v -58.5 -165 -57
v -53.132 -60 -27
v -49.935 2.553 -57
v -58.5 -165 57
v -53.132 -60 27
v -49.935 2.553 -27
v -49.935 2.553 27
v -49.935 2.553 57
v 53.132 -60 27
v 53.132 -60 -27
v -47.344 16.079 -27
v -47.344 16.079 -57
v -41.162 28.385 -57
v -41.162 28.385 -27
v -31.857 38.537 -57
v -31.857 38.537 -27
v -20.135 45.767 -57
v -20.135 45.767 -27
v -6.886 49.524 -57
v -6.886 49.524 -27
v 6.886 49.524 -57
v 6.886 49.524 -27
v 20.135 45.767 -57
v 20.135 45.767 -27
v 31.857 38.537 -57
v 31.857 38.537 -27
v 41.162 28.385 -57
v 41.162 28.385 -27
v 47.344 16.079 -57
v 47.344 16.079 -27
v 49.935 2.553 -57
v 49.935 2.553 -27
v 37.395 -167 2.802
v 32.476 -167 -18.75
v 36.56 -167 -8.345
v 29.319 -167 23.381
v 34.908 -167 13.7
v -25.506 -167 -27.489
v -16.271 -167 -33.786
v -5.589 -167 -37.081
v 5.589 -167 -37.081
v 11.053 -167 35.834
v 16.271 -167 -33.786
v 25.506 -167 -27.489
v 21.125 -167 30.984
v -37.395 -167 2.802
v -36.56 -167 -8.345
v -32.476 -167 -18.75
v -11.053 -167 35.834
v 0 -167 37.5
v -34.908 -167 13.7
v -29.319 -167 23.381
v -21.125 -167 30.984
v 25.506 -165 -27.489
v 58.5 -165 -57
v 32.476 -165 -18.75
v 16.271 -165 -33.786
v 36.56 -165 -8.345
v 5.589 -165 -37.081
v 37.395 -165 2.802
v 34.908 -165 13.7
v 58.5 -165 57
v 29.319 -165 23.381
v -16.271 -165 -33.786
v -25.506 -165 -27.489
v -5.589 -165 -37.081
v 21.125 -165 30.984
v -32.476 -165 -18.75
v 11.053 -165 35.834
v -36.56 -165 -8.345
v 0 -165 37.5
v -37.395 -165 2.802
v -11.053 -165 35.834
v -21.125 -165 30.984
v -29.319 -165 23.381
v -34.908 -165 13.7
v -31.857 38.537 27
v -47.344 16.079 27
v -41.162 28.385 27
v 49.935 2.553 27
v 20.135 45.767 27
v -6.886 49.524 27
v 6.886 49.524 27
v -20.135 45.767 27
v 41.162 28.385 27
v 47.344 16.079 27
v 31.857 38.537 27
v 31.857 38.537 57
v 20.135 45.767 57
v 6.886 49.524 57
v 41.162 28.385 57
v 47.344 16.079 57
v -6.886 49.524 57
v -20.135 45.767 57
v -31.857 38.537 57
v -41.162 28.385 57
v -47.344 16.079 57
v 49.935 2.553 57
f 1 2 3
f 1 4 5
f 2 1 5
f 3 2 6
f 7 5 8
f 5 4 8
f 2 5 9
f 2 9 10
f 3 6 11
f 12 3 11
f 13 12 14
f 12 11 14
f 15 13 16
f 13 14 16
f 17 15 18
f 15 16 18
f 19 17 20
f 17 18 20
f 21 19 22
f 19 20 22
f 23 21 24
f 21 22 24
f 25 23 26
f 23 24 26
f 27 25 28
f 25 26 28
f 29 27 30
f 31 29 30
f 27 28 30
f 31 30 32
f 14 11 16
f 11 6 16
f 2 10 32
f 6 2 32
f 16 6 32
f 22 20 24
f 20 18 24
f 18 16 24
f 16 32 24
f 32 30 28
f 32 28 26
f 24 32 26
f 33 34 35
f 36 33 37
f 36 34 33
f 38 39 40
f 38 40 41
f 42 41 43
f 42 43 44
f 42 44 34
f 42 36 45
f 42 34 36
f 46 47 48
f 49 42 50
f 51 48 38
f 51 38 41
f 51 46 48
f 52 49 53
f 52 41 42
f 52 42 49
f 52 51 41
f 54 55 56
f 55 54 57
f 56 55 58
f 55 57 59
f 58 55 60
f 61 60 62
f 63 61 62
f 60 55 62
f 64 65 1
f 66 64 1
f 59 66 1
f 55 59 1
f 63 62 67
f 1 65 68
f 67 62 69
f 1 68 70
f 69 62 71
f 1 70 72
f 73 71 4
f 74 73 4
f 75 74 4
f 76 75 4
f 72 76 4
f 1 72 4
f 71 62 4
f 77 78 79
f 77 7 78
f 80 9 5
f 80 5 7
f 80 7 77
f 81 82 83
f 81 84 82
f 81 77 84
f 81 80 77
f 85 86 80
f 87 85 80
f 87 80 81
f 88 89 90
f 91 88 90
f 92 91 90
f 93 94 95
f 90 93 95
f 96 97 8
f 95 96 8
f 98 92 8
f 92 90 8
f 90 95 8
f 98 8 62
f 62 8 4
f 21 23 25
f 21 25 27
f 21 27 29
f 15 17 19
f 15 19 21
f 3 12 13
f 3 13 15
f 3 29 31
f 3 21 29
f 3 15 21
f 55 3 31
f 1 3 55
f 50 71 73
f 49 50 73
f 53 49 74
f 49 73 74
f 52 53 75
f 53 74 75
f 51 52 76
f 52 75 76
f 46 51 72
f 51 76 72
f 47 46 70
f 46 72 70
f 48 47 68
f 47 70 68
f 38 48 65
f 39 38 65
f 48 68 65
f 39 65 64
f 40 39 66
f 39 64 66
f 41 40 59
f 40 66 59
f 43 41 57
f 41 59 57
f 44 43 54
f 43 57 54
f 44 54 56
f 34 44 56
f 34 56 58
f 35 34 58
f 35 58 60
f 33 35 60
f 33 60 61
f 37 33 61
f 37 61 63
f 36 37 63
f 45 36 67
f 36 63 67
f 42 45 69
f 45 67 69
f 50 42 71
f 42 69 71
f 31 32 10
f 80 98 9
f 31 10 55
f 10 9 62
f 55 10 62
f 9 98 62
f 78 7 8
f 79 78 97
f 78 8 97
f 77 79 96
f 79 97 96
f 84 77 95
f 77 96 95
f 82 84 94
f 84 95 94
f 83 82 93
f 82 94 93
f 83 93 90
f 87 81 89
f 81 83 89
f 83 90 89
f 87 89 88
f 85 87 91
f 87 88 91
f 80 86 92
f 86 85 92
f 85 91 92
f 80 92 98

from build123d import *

# Parameters (mm, degrees)
BOSS_EXTRUDE1_DEPTH     = 57
SKETCH2_R               = 37.5
BOSS_EXTRUDE2_DEPTH     = 2
CUT_EXTRUDE1_DEPTH      = 186.90387301
CUT_EXTRUDE1_DEPTH_BACK = 186.90387301
SKETCH3_W               = 113.978189674
SKETCH3_H               = 54
BODY_MOVE_COPY1_ANGLE   = 90


with BuildPart() as part:
    # Sketch1 → Boss-Extrude1 (new, symmetric)
    with BuildSketch(Plane.XY):
        with BuildLine():
            Line((-165, -58.5), (-165, 58.5))
            Line((-165, 58.5), (2.552640416, 49.934797756))
            ThreePointArc((2.552640416, 49.934797756), (50, 0), (2.552640416, -49.934797756))
            Line((2.552640416, -49.934797756), (-165, -58.5))
        make_face()
    extrude(amount=BOSS_EXTRUDE1_DEPTH, both=True)

    # Sketch2 → Boss-Extrude2 (add)
    with BuildSketch(Plane.ZY.offset(165)):
        Circle(SKETCH2_R)
    extrude(amount=BOSS_EXTRUDE2_DEPTH)

    # Sketch3 → Cut-Extrude1 (cut, two sides: drawn at the far end of the back side and taken through both)
    with BuildSketch(Plane(origin=(0, 0, 0), x_dir=(1, 0, 0), z_dir=(0, 1, 0)).offset(-CUT_EXTRUDE1_DEPTH_BACK)):
        with Locations((-3.010905163, 0)):
            Rectangle(SKETCH3_W, SKETCH3_H)
    extrude(amount=CUT_EXTRUDE1_DEPTH + CUT_EXTRUDE1_DEPTH_BACK, mode=Mode.SUBTRACT)


with BuildPart() as part_1:
    # Body-Move/Copy1: moved
    add(part.part.rotate(Axis((0, 0, 0), (0, 0, 1)), BODY_MOVE_COPY1_ANGLE))


solid = part_1.part
